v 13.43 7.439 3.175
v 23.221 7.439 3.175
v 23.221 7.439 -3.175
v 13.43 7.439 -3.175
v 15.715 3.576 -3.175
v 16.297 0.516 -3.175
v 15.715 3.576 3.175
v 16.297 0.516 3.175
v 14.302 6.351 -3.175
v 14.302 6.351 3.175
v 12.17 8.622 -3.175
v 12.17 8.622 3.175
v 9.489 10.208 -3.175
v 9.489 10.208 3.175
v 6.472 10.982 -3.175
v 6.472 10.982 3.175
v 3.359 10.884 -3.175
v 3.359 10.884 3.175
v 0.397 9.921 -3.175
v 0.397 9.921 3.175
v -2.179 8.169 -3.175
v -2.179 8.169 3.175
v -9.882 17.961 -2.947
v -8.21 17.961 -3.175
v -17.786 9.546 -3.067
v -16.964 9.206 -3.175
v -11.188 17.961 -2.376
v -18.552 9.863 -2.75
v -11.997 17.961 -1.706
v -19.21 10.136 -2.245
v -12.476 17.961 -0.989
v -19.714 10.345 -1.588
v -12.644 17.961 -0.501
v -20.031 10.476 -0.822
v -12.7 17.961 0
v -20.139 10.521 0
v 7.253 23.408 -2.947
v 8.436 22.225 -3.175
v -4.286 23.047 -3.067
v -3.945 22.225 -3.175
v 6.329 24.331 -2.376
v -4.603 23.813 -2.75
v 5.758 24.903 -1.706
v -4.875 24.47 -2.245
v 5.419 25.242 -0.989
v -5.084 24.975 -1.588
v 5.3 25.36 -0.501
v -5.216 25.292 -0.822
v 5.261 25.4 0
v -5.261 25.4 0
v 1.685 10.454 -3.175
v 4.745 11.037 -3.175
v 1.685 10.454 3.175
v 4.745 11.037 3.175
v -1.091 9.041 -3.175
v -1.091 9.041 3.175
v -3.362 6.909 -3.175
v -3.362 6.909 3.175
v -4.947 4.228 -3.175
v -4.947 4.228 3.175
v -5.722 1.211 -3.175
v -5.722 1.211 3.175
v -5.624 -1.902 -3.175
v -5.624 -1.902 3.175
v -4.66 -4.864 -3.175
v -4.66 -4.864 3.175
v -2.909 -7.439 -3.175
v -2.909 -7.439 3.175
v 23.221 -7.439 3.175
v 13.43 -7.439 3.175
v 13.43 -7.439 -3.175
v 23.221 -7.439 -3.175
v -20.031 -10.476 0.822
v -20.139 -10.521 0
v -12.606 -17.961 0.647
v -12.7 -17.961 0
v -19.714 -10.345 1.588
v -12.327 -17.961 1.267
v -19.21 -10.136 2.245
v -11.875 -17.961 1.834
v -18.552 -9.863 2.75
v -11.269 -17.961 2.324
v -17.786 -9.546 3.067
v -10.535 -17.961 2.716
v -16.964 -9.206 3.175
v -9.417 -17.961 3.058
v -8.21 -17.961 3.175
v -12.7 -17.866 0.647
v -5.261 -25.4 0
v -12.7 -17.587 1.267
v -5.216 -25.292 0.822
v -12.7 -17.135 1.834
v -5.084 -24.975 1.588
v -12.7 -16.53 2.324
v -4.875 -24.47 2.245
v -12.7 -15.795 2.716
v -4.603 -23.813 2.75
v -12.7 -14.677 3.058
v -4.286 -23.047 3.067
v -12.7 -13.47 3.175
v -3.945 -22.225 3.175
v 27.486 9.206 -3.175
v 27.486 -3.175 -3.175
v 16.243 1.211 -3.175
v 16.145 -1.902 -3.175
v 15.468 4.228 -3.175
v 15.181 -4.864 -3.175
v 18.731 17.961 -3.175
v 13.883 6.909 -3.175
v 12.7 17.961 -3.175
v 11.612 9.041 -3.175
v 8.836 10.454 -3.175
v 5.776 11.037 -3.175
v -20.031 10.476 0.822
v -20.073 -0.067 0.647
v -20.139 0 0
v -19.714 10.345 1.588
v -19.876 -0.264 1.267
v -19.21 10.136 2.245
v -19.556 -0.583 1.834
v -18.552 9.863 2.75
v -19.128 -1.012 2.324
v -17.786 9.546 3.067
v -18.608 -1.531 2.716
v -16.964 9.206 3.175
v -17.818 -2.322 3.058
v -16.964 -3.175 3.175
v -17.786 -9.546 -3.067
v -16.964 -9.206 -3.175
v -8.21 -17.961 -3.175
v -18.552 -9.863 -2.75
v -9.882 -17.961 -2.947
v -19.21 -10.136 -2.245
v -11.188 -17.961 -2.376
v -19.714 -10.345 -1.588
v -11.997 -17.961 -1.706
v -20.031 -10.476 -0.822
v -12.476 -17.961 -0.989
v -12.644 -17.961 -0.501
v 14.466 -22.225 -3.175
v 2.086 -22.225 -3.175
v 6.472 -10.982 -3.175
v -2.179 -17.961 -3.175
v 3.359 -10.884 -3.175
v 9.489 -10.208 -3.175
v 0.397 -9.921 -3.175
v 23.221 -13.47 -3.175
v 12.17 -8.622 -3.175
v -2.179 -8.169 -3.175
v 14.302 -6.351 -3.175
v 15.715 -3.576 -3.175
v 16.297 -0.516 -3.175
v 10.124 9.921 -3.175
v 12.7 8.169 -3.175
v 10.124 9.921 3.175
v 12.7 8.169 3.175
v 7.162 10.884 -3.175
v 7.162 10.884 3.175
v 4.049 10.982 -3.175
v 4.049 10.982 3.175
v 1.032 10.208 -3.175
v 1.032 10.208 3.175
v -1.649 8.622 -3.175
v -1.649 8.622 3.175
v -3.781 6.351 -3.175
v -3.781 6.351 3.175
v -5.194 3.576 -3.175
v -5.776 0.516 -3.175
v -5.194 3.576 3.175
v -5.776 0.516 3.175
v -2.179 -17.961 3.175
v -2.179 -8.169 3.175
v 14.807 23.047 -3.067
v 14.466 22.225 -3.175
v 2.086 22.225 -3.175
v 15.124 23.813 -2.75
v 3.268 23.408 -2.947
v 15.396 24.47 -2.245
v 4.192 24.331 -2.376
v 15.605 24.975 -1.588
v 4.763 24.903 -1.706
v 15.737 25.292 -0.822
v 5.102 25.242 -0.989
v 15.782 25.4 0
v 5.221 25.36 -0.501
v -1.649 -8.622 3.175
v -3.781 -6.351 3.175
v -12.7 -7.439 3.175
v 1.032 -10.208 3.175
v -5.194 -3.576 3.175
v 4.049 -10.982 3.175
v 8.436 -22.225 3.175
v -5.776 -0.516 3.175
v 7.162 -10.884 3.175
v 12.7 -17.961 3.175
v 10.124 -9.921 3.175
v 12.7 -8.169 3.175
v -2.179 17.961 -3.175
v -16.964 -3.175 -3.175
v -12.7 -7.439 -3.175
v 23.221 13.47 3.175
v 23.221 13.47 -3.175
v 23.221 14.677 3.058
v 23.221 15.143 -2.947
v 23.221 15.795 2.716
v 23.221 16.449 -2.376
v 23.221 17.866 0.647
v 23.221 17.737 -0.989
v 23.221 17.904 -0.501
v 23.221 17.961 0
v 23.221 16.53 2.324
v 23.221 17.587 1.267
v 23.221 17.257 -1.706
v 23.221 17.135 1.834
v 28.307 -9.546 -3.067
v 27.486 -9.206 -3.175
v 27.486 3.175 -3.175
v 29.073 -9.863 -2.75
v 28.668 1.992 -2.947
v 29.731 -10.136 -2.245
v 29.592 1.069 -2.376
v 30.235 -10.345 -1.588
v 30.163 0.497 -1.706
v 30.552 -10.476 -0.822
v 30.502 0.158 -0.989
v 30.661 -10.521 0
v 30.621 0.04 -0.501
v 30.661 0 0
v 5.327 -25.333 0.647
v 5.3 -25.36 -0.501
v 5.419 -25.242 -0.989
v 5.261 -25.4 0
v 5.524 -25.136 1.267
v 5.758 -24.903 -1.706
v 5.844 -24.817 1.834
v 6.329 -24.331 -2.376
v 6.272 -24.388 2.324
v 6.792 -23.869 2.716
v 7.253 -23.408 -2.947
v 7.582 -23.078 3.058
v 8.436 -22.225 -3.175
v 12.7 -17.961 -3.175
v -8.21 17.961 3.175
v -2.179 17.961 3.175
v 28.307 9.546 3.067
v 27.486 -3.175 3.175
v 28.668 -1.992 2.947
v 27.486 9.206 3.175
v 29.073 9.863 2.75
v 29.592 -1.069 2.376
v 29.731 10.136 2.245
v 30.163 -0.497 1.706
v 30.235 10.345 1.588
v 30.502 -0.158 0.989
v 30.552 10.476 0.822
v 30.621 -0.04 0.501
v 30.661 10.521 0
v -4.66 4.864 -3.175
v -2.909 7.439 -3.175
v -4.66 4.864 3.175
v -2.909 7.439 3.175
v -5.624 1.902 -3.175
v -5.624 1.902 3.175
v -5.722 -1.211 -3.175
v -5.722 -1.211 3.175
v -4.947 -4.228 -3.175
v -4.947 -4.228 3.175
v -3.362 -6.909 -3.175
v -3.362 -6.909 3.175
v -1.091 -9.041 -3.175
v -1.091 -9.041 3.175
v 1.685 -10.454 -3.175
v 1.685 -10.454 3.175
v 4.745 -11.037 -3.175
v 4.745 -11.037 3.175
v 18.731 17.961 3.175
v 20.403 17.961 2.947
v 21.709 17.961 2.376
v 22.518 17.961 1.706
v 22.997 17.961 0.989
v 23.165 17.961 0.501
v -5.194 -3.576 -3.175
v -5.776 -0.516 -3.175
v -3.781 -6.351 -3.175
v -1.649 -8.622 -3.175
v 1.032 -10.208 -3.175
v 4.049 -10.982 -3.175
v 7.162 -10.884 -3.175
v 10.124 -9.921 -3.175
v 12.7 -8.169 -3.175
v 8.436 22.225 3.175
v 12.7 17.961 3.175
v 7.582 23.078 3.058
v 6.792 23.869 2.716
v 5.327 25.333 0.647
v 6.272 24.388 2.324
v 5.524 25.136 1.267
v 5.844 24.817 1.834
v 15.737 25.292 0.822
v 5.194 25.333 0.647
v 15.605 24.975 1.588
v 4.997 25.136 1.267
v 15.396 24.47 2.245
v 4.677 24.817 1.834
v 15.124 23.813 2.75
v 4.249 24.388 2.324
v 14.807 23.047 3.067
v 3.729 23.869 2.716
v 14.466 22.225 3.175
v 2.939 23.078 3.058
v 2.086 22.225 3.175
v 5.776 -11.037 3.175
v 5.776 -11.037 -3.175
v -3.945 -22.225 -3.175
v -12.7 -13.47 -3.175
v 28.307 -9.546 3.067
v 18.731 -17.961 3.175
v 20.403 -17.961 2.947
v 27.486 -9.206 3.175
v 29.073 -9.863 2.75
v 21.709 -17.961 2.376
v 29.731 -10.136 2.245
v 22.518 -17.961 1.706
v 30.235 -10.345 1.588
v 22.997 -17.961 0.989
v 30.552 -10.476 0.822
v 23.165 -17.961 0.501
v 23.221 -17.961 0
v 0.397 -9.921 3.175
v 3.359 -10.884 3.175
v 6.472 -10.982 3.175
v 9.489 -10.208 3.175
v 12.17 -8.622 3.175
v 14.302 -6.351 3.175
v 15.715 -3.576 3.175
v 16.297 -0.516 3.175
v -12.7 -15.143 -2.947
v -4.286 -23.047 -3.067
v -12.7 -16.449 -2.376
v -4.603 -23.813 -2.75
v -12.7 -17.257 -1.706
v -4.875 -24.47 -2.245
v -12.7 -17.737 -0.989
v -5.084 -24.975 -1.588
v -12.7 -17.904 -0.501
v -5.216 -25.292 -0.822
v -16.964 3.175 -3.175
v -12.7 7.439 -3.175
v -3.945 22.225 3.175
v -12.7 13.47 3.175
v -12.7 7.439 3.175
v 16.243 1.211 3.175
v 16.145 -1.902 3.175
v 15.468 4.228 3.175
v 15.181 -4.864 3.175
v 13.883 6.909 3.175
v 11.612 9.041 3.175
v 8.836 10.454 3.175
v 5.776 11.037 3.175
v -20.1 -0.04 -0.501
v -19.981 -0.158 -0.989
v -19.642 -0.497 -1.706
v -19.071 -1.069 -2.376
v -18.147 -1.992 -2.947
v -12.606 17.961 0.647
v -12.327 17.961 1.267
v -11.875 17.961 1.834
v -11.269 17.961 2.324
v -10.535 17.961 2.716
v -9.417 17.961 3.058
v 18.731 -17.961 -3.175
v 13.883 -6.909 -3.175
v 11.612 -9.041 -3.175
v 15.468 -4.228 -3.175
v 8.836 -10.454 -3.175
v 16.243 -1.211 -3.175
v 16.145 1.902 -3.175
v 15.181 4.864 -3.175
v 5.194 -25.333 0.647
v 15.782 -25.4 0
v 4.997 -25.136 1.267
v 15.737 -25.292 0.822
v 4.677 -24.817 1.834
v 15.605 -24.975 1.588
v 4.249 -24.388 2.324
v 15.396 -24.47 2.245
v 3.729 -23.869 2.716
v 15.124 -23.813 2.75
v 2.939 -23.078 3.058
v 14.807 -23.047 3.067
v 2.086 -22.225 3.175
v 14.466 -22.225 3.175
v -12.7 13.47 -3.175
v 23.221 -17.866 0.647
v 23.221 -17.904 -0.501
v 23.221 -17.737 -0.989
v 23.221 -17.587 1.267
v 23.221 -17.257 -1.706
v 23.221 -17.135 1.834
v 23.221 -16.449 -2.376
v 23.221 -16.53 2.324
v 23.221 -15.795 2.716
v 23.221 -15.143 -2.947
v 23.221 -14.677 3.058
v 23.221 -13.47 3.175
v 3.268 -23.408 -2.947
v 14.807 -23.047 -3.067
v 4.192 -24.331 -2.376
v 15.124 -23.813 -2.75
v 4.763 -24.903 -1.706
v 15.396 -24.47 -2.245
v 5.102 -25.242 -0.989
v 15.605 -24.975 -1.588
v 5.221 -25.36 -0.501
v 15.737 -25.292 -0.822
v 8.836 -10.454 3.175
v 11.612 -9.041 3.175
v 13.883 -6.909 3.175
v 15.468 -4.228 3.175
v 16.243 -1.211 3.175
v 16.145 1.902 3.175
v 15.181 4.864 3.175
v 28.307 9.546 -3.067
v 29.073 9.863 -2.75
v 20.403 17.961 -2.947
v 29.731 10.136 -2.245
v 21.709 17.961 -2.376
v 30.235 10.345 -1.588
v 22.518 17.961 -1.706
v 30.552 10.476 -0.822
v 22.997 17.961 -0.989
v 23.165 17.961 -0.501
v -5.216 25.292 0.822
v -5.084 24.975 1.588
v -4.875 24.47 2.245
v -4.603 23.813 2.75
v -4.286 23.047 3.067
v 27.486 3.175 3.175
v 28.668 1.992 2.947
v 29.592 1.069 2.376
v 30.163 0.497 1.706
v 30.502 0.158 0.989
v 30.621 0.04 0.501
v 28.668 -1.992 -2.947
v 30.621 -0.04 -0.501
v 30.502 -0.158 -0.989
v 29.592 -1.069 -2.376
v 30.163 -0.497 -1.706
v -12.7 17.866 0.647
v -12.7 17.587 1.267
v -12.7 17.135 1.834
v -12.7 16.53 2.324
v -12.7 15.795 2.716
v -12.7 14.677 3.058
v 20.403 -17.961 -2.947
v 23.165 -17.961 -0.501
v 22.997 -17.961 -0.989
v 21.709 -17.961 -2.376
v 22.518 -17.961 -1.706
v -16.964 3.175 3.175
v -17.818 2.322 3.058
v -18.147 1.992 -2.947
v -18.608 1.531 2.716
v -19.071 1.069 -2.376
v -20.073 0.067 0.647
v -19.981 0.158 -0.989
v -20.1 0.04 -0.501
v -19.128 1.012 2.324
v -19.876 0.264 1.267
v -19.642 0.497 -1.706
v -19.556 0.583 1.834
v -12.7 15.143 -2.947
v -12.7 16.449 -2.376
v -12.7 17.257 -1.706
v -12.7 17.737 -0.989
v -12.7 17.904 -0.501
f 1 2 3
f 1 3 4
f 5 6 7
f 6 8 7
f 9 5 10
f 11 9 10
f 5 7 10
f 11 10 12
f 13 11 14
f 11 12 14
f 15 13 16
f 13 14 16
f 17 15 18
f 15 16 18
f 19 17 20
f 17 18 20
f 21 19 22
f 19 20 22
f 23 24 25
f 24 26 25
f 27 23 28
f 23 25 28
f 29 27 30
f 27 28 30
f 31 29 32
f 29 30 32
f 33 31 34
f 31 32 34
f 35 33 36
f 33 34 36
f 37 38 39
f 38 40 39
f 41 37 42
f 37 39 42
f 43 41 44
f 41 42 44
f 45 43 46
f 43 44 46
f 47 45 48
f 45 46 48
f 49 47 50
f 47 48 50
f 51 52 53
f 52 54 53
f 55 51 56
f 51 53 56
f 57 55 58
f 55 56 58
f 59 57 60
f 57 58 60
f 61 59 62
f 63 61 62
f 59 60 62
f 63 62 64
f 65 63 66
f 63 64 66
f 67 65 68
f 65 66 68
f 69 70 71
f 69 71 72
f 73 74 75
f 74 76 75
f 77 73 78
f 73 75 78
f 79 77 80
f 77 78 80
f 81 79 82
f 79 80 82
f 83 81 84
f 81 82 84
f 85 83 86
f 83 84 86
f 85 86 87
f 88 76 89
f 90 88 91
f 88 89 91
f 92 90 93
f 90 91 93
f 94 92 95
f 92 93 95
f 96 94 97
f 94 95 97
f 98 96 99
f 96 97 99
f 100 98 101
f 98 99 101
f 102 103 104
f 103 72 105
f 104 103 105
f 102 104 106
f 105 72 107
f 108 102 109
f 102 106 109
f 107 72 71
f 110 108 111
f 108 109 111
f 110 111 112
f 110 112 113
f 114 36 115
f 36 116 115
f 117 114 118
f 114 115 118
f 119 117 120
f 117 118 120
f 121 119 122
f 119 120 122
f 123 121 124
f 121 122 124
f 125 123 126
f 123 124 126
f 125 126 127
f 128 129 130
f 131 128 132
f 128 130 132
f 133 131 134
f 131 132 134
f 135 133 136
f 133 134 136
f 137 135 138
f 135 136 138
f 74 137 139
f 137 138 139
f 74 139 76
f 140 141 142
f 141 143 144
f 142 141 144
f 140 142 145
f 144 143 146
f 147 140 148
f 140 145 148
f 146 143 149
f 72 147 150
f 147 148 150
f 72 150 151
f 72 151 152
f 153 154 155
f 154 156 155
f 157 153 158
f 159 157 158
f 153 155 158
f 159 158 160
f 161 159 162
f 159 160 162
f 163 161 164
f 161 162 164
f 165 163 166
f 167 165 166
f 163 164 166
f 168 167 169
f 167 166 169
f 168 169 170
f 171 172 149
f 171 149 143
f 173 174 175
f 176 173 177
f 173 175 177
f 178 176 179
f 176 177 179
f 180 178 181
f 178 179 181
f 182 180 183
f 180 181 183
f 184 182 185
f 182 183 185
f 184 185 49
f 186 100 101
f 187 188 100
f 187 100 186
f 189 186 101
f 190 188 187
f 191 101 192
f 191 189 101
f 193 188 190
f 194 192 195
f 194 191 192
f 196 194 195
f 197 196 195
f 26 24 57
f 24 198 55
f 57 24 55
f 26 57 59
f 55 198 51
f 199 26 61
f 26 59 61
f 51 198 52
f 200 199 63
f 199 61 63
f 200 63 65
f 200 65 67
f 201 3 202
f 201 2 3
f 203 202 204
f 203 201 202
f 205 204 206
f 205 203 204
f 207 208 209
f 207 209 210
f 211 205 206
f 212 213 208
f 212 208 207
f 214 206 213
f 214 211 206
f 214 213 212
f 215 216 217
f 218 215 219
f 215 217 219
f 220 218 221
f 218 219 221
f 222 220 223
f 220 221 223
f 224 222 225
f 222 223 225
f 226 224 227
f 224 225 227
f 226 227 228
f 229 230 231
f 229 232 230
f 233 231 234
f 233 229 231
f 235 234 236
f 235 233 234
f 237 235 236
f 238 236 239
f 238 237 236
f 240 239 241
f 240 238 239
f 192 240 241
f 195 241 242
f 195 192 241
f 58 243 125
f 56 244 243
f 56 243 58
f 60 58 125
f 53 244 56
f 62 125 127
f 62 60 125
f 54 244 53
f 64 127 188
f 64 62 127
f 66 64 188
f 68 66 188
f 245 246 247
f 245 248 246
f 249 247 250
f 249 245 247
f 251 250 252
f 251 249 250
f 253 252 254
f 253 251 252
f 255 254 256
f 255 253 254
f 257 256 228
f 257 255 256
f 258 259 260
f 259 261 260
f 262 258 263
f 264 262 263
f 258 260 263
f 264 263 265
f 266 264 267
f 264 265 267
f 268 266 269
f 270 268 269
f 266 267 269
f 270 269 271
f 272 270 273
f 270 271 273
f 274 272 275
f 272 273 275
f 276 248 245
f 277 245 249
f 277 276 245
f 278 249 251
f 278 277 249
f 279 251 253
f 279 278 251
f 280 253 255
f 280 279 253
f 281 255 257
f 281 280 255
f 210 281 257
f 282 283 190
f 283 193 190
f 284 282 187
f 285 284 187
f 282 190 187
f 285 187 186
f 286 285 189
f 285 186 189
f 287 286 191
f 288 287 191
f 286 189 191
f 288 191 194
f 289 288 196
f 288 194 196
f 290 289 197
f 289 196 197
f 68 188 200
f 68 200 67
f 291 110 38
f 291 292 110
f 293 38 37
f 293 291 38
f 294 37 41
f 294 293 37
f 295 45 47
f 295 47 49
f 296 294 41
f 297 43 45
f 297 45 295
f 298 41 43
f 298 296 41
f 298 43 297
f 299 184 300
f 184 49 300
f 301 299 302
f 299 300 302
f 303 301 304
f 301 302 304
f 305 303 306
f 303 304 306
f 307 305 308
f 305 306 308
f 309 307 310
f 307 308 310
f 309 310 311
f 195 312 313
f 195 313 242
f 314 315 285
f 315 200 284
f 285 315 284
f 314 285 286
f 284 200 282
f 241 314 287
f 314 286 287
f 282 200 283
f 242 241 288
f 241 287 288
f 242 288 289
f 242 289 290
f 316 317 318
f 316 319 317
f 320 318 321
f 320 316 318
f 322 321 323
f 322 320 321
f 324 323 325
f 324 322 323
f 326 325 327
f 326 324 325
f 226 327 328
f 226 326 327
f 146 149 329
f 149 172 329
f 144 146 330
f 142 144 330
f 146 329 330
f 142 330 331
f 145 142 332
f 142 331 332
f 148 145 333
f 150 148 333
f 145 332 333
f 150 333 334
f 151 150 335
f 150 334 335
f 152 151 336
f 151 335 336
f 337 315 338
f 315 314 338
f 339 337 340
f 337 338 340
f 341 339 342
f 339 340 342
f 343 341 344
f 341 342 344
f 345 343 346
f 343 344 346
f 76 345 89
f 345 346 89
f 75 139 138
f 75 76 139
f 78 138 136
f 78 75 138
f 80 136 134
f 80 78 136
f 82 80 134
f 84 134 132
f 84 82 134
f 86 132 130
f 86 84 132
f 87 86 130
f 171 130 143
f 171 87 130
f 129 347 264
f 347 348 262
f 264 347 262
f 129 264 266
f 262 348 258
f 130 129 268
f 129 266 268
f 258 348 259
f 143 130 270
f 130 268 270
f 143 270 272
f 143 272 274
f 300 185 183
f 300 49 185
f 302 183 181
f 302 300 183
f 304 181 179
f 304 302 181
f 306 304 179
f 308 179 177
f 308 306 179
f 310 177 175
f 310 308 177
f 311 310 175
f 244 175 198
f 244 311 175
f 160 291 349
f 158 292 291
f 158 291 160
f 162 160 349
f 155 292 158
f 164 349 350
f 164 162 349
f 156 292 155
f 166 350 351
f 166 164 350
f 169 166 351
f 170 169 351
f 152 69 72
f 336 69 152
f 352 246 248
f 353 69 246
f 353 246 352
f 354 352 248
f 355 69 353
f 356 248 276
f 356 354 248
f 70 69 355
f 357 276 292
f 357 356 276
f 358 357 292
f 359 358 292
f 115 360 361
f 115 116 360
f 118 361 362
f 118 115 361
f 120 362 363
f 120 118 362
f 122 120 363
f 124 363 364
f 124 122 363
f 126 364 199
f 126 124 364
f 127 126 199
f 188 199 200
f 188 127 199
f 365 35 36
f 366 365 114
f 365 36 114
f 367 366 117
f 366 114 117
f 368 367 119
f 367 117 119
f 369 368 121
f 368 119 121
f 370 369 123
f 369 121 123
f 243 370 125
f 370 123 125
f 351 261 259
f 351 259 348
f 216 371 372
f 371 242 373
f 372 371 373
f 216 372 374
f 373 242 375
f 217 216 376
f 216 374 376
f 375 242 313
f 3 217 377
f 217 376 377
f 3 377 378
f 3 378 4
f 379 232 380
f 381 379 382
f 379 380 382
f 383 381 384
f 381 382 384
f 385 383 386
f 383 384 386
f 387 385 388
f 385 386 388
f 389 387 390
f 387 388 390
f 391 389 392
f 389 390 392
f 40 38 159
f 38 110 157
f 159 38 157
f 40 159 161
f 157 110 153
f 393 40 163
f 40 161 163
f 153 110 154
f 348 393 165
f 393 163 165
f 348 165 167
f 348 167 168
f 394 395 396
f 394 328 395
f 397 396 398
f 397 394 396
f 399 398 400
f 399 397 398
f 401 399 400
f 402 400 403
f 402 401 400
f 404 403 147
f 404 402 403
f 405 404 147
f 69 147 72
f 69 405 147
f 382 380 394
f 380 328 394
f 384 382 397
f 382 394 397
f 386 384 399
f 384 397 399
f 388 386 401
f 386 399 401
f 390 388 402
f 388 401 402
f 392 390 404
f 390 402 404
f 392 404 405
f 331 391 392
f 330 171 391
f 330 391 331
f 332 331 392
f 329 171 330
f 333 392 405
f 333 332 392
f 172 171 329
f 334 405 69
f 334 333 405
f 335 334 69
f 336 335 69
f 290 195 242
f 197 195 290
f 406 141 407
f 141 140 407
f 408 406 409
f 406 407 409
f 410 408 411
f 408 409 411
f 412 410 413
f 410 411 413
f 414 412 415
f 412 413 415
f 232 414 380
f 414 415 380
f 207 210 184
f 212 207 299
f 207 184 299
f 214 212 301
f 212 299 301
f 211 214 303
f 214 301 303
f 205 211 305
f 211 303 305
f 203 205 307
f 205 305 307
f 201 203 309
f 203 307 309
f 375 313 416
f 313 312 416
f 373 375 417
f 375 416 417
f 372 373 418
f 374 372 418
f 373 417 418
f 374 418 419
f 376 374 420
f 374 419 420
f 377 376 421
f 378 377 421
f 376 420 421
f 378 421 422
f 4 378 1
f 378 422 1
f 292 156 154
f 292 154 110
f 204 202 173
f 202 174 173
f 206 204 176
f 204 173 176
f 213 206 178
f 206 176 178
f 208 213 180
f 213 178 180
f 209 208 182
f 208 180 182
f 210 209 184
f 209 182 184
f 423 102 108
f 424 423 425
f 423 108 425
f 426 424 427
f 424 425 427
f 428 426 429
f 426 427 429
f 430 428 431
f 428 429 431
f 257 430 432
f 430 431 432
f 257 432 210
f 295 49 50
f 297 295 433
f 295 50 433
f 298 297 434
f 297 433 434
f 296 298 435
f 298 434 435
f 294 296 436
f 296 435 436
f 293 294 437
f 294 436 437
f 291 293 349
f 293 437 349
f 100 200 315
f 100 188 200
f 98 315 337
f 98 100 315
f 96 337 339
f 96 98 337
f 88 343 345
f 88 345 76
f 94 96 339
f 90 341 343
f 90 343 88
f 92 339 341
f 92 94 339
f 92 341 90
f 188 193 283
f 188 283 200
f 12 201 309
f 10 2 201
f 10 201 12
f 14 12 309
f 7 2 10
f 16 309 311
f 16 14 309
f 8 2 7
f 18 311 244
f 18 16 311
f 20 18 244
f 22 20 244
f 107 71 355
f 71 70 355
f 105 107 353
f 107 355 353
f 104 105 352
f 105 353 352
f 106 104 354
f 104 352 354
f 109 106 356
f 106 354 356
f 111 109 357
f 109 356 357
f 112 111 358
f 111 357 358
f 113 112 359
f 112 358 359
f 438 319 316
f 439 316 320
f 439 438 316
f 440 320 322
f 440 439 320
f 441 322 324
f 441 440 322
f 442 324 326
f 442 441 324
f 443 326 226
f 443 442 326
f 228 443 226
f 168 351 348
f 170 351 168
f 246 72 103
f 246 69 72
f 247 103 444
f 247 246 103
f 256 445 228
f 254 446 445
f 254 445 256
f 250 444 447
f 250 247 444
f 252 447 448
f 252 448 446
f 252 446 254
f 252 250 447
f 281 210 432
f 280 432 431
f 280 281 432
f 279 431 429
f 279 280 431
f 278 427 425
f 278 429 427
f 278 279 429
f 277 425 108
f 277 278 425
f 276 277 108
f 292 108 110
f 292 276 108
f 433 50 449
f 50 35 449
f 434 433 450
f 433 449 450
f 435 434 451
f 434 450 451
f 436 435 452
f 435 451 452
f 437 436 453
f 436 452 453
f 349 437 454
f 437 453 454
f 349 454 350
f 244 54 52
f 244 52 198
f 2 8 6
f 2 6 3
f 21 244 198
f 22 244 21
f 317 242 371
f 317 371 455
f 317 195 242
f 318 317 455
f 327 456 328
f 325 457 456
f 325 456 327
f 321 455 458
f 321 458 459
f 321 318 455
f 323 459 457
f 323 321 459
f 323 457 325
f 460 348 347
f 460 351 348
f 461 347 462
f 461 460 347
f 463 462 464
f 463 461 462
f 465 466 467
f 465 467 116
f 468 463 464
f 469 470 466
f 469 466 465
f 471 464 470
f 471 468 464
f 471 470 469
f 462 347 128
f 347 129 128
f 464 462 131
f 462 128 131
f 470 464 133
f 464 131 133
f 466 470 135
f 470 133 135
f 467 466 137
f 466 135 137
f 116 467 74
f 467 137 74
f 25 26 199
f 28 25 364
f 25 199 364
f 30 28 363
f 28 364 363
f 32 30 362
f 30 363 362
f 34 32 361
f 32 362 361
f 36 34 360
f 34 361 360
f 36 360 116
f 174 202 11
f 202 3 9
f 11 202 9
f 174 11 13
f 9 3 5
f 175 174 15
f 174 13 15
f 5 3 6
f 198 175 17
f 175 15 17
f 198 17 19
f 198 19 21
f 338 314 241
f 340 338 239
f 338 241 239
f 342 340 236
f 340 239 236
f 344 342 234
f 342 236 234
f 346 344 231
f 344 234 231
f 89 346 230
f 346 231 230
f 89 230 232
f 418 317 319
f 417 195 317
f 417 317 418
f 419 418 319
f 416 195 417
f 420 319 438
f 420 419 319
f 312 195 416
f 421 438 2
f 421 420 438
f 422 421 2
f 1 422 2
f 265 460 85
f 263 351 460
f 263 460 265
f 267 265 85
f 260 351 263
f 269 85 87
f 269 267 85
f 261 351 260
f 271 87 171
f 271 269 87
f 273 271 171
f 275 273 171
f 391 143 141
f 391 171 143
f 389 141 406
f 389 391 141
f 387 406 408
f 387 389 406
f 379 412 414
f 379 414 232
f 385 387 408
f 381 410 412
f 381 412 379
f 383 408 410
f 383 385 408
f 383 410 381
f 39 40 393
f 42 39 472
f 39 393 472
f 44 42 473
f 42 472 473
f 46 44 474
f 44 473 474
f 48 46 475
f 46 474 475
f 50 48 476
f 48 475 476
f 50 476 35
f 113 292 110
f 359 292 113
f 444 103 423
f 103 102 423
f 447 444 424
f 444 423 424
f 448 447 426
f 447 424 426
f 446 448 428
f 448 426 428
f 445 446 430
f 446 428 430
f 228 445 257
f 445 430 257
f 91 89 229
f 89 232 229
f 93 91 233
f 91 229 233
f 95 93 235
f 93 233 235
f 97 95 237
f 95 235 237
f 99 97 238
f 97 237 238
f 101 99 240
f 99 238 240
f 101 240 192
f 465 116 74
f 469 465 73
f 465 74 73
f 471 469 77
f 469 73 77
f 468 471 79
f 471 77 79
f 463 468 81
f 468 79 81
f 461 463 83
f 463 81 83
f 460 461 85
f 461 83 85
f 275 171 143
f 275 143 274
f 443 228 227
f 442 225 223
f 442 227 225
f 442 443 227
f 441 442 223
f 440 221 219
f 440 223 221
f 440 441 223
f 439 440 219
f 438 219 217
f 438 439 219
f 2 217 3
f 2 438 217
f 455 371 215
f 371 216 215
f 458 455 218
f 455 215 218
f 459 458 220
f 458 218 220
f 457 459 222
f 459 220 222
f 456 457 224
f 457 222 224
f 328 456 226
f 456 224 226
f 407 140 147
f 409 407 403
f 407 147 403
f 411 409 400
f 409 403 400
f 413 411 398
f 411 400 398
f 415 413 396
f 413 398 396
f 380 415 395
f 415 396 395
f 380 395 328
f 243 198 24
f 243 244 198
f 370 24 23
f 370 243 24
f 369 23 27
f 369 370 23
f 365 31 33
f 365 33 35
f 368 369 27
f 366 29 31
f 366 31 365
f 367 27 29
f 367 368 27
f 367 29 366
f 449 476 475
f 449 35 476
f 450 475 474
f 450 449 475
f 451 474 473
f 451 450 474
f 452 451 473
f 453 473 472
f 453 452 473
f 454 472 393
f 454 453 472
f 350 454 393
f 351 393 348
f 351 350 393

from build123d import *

# Parameters (mm, degrees)
F1_DEPTH = 3.175
F2_COUNT = 8
F3_R     = 11.049
F4_DEPTH = 12.7
F5_R     = 3.17499
F5_2_R   = 3.17499
F5_3_R   = 3.17499
F5_4_R   = 3.17499
F5_5_R   = 3.17499
F5_6_R   = 3.17499
F5_7_R   = 3.17499
F5_8_R   = 3.17499


# Not quite as in the source:
# - a fillet or chamfer is up to 0.001 mm smaller than in the source, because OpenCascade refuses the exact size


with BuildPart() as f1:
    # F0 (on Top) → F1 (new body, symmetric)
    with BuildSketch(Plane.XY):
        Polygon((5.2605122421, 0), (-5.2605122421, 0), (-12.7, -7.4394877579), (-12.7, -17.9605122421), (-5.2605122421, -25.4), (5.2605122421, -25.4), (12.7, -17.9605122421), (12.7, -7.4394877579), align=None)
    extrude(amount=F1_DEPTH, both=True)


with BuildPart() as f2_1:
    # F2: instance of F1
    add(f1.part.rotate(Axis((5.2605122421, 0, 0), (0, 0, 1)), 1 * 360 / F2_COUNT))


with BuildPart() as f2_2:
    # F2: instance of F1
    add(f1.part.rotate(Axis((5.2605122421, 0, 0), (0, 0, 1)), 2 * 360 / F2_COUNT))


with BuildPart() as f2_3:
    # F2: instance of F1
    add(f1.part.rotate(Axis((5.2605122421, 0, 0), (0, 0, 1)), 3 * 360 / F2_COUNT))


with BuildPart() as f2_4:
    # F2: instance of F1
    add(f1.part.rotate(Axis((5.2605122421, 0, 0), (0, 0, 1)), 4 * 360 / F2_COUNT))


with BuildPart() as f2_5:
    # F2: instance of F1
    add(f1.part.rotate(Axis((5.2605122421, 0, 0), (0, 0, 1)), 5 * 360 / F2_COUNT))


with BuildPart() as f2_6:
    # F2: instance of F1
    add(f1.part.rotate(Axis((5.2605122421, 0, 0), (0, 0, 1)), 6 * 360 / F2_COUNT))


with BuildPart() as f2_7:
    # F2: instance of F1
    add(f1.part.rotate(Axis((5.2605122421, 0, 0), (0, 0, 1)), 7 * 360 / F2_COUNT))


with BuildPart() as f4_tool:
    # F3 (on Top) → F4 (new body, symmetric)
    with BuildSketch(Plane.XY):
        with Locations((5.2605122421, 0)):
            Circle(F3_R)
    extrude(amount=F4_DEPTH, both=True)


with BuildPart() as f1_1:
    add(f1.part)

    # F4: cut by f4_tool
    add(f4_tool.part, mode=Mode.SUBTRACT)

    # F5#7 (radius 3.175 in the source; OpenCascade refuses exactly that, so slightly less here)
    f5_7_edges = [f1_1.edges().sort_by_distance(p)[0] for p in [
        (-8.980256, -21.680256, 3.175),
        (0, -25.4, 3.175),
        (-8.980256, -21.680256, -3.175),
        (0, -25.4, -3.175),
    ]]
    fillet(f5_7_edges, radius=F5_7_R)


with BuildPart() as f2_1_1:
    add(f2_1.part)

    # F4: cut by f4_tool
    add(f4_tool.part, mode=Mode.SUBTRACT)

    # F5#8 (radius 3.175 in the source; OpenCascade refuses exactly that, so slightly less here)
    f5_8_edges = [f2_1_1.edges().sort_by_distance(p)[0] for p in [
        (10.521024, -25.4, 3.175),
        (19.501281, -21.680256, 3.175),
        (10.521024, -25.4, -3.175),
        (19.501281, -21.680256, -3.175),
    ]]
    fillet(f5_8_edges, radius=F5_8_R)


with BuildPart() as f2_2_1:
    add(f2_2.part)

    # F4: cut by f4_tool
    add(f4_tool.part, mode=Mode.SUBTRACT)

    # F5 (radius 3.175 in the source; OpenCascade refuses exactly that, so slightly less here)
    f5_edges = [f2_2_1.edges().sort_by_distance(p)[0] for p in [
        (30.660512, -5.260512, 3.175),
        (26.940768, -14.240768, 3.175),
        (26.940768, -14.240768, -3.175),
        (30.660512, -5.260512, -3.175),
    ]]
    fillet(f5_edges, radius=F5_R)


with BuildPart() as f2_3_1:
    add(f2_3.part)

    # F4: cut by f4_tool
    add(f4_tool.part, mode=Mode.SUBTRACT)

    # F5#2 (radius 3.175 in the source; OpenCascade refuses exactly that, so slightly less here)
    f5_2_edges = [f2_3_1.edges().sort_by_distance(p)[0] for p in [
        (30.660512, 5.260512, 3.175),
        (26.940768, 14.240768, 3.175),
        (30.660512, 5.260512, -3.175),
        (26.940768, 14.240768, -3.175),
    ]]
    fillet(f5_2_edges, radius=F5_2_R)


with BuildPart() as f2_4_1:
    add(f2_4.part)

    # F4: cut by f4_tool
    add(f4_tool.part, mode=Mode.SUBTRACT)

    # F5#3 (radius 3.175 in the source; OpenCascade refuses exactly that, so slightly less here)
    f5_3_edges = [f2_4_1.edges().sort_by_distance(p)[0] for p in [
        (19.501281, 21.680256, 3.175),
        (10.521024, 25.4, 3.175),
        (19.501281, 21.680256, -3.175),
        (10.521024, 25.4, -3.175),
    ]]
    fillet(f5_3_edges, radius=F5_3_R)


with BuildPart() as f2_5_1:
    add(f2_5.part)

    # F4: cut by f4_tool
    add(f4_tool.part, mode=Mode.SUBTRACT)

    # F5#4 (radius 3.175 in the source; OpenCascade refuses exactly that, so slightly less here)
    f5_4_edges = [f2_5_1.edges().sort_by_distance(p)[0] for p in [
        (0, 25.4, 3.175),
        (-8.980256, 21.680256, 3.175),
        (0, 25.4, -3.175),
        (-8.980256, 21.680256, -3.175),
    ]]
    fillet(f5_4_edges, radius=F5_4_R)


with BuildPart() as f2_6_1:
    add(f2_6.part)

    # F4: cut by f4_tool
    add(f4_tool.part, mode=Mode.SUBTRACT)

    # F5#5 (radius 3.175 in the source; OpenCascade refuses exactly that, so slightly less here)
    f5_5_edges = [f2_6_1.edges().sort_by_distance(p)[0] for p in [
        (-16.419744, 14.240768, 3.175),
        (-20.139488, 5.260512, 3.175),
        (-16.419744, 14.240768, -3.175),
        (-20.139488, 5.260512, -3.175),
    ]]
    fillet(f5_5_edges, radius=F5_5_R)


with BuildPart() as f2_7_1:
    add(f2_7.part)

    # F4: cut by f4_tool
    add(f4_tool.part, mode=Mode.SUBTRACT)

    # F5#6 (radius 3.175 in the source; OpenCascade refuses exactly that, so slightly less here)
    f5_6_edges = [f2_7_1.edges().sort_by_distance(p)[0] for p in [
        (-20.139488, -5.260512, 3.175),
        (-16.419744, -14.240768, 3.175),
        (-20.139488, -5.260512, -3.175),
        (-16.419744, -14.240768, -3.175),
    ]]
    fillet(f5_6_edges, radius=F5_6_R)


solid = Compound([f1_1.part, f2_1_1.part, f2_2_1.part, f2_3_1.part, f2_4_1.part, f2_5_1.part, f2_6_1.part, f2_7_1.part])
